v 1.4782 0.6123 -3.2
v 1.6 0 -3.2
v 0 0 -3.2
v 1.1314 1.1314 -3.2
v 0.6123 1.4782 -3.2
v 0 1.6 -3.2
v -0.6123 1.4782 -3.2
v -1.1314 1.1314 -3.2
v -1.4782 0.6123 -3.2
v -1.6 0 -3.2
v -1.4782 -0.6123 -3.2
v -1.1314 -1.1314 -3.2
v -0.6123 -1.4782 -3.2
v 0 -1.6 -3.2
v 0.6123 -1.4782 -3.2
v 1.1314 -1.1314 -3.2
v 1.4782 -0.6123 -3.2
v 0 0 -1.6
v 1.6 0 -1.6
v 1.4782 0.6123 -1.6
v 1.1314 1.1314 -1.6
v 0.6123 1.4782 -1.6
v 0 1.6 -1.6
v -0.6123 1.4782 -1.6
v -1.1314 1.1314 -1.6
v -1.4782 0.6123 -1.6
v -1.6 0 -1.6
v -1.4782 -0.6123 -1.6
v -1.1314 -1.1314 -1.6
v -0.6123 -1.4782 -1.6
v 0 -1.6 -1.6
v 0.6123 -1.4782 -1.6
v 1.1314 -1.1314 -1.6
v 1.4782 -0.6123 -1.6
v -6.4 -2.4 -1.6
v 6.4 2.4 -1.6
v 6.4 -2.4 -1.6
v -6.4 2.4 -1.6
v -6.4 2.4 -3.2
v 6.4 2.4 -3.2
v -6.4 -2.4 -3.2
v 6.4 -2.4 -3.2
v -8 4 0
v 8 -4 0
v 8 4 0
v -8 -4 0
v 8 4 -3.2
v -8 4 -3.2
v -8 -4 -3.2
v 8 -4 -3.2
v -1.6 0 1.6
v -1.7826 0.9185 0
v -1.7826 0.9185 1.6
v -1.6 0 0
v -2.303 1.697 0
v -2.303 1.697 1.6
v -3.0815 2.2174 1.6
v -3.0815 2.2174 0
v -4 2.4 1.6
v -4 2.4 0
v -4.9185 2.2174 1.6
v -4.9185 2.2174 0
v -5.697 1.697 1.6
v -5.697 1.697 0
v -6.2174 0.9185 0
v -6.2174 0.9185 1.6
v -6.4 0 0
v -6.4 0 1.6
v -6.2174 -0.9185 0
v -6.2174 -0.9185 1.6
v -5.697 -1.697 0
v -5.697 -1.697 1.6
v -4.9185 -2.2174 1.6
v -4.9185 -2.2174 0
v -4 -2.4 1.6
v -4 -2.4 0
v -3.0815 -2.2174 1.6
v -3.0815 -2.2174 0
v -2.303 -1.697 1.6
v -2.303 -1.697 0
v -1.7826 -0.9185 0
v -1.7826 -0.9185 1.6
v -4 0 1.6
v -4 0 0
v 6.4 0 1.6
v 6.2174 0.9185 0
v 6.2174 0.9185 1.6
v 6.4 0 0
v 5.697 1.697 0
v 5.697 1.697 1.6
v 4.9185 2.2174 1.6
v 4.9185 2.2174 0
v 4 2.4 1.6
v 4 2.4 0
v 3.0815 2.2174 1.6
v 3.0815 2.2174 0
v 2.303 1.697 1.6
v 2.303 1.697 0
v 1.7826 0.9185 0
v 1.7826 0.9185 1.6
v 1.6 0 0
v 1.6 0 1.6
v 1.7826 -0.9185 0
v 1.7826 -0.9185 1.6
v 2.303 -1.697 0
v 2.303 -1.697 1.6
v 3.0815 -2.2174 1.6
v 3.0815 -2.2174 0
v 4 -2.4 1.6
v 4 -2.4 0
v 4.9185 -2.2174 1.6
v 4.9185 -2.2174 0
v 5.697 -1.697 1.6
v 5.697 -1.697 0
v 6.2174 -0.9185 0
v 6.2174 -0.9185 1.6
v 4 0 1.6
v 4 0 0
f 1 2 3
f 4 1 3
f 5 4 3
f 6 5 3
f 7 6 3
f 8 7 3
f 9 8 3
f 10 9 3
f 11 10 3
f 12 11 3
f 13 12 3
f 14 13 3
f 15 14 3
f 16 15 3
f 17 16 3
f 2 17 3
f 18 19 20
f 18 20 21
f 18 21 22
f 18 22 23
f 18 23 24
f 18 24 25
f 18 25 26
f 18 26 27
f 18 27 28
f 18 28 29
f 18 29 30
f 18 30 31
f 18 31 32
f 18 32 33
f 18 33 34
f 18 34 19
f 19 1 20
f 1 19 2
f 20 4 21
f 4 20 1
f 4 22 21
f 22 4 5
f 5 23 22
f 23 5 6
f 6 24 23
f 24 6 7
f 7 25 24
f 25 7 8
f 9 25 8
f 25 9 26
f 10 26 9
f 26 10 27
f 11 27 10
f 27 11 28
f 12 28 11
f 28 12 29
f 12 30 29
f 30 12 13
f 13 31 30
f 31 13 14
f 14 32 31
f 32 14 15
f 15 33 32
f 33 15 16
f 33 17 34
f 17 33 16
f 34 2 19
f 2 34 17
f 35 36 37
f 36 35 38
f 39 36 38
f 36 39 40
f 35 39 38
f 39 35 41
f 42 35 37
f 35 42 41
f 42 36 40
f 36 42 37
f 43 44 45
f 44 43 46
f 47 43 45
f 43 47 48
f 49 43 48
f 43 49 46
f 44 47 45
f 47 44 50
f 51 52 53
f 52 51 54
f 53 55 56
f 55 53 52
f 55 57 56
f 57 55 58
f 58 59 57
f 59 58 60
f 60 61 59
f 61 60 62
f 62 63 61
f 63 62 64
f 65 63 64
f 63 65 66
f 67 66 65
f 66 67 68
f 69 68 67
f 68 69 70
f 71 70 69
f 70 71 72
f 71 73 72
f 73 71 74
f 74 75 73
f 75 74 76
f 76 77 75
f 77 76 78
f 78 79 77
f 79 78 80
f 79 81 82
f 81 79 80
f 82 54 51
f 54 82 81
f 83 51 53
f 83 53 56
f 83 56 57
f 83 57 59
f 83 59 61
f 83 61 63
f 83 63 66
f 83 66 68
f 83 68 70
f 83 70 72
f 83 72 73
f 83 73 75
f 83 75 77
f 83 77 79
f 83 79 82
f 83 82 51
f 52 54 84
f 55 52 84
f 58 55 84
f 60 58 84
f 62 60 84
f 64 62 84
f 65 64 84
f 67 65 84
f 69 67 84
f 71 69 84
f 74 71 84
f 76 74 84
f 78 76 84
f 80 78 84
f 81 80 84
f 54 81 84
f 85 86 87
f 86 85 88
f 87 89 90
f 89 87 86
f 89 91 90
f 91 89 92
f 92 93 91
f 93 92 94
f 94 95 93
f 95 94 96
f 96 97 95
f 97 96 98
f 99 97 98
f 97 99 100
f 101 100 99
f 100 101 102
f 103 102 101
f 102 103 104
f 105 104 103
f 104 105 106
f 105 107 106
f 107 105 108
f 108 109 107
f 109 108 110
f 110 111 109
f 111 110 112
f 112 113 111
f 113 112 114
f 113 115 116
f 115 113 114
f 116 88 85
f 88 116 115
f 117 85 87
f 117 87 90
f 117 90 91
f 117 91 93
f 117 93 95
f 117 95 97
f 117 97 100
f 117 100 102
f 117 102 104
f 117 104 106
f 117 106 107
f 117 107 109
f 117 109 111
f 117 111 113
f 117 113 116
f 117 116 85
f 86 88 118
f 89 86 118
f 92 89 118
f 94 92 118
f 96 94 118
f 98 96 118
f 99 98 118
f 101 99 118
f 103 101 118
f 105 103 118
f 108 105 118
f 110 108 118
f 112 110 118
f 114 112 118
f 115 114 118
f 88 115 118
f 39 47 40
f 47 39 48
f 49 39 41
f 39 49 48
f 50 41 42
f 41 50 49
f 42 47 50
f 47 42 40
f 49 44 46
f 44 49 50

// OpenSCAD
// file: ../p/stud.scad
use <../lib.scad>
use <4-4cyli.scad>
use <4-4disc.scad>
use <4-4edge.scad>
function ldraw_lib__stud() = [
// 0 Stud
// 0 Name: stud.dat
// 0 Author: James Jessiman
// 0 !LDRAW_ORG Primitive UPDATE 2012-01
// 0 !LICENSE Licensed under CC BY 4.0 : see CAreadme.txt
// 
// 0 BFC CERTIFY CCW
  [0,"BFC","CERTIFY"],
  [0,"BFC","CCW"],
// 
// 0 !HISTORY 2002-04-04 [sbliss] Modified for BFC compliance
// 0 !HISTORY 2002-04-25 [PTadmin] Official Update 2002-02
// 0 !HISTORY 2007-06-24 [PTadmin] Header formatted for Contributor Agreement
// 0 !HISTORY 2008-07-01 [PTadmin] Official Update 2008-01
// 0 !HISTORY 2012-02-16 [Philo] Changed to CCW
// 0 !HISTORY 2012-03-30 [PTadmin] Official Update 2012-01
// 
// 
// 1 16 0 0 0 6 0 0 0 1 0 0 0 6 4-4edge.dat
  [1,16,0,0,0,6,0,0,0,1,0,0,0,6, ldraw_lib__4_4edge()],
// 1 16 0 -4 0 6 0 0 0 1 0 0 0 6 4-4edge.dat
  [1,16,0,-4,0,6,0,0,0,1,0,0,0,6, ldraw_lib__4_4edge()],
// 1 16 0 0 0 6 0 0 0 -4 0 0 0 6 4-4cyli.dat
  [1,16,0,0,0,6,0,0,0,-4,0,0,0,6, ldraw_lib__4_4cyli()],
// 1 16 0 -4 0 6 0 0 0 1 0 0 0 6 4-4disc.dat
  [1,16,0,-4,0,6,0,0,0,1,0,0,0,6, ldraw_lib__4_4disc()],
  [-1,16,0,0,0,6,0,0,0,-1,0,0,0,6, ldraw_lib__4_4disc()],
];
module ldraw_lib__stud(step=0, col=false, unit=2/5, alt=false, line=0.2, solid=!$preview)
    makepoly(ldraw_lib__stud(), step=step, col=col, unit=unit, alt=alt, line=line, solid=solid);
ldraw_lib__stud(line=0.2);
// file: ../p/4-4edge.scad
use <../lib.scad>
function ldraw_lib__4_4edge() = [
// 0 Circle 1.0
// 0 Name: 4-4edge.dat
// 0 Author: James Jessiman
// 0 !LDRAW_ORG Primitive UPDATE 2017-01
// 0 !LICENSE Licensed under CC BY 2.0 and CC BY 4.0 : see CAreadme.txt
// 
// 0 BFC CERTIFY CCW
  [0,"BFC","CERTIFY"],
  [0,"BFC","CCW"],
// 
// 0 !HISTORY 1998-12-15 [PTadmin] Official Update 1998-10
// 0 !HISTORY 2005-12-28 [PTadmin] Official Update 2005-01
// 0 !HISTORY 2007-06-24 [PTadmin] Header formatted for Contributor Agreement
// 0 !HISTORY 2008-07-01 [PTadmin] Official Update 2008-01
// 0 !HISTORY 2017-01-15 [Steffen] BFCed
// 0 !HISTORY 2017-12-30 [PTadmin] Official Update 2017-01
// 
// 
// 2 24 1 0 0 0.9239 0 0.3827
  [2,24,1,0,0,0.9239,0,0.3827],
// 2 24 0.9239 0 0.3827 0.7071 0 0.7071
  [2,24,0.9239,0,0.3827,0.7071,0,0.7071],
// 2 24 0.7071 0 0.7071 0.3827 0 0.9239
  [2,24,0.7071,0,0.7071,0.3827,0,0.9239],
// 2 24 0.3827 0 0.9239 0 0 1
  [2,24,0.3827,0,0.9239,0,0,1],
// 2 24 0 0 1 -0.3827 0 0.9239
  [2,24,0,0,1,-0.3827,0,0.9239],
// 2 24 -0.3827 0 0.9239 -0.7071 0 0.7071
  [2,24,-0.3827,0,0.9239,-0.7071,0,0.7071],
// 2 24 -0.7071 0 0.7071 -0.9239 0 0.3827
  [2,24,-0.7071,0,0.7071,-0.9239,0,0.3827],
// 2 24 -0.9239 0 0.3827 -1 0 -0
  [2,24,-0.9239,0,0.3827,-1,0,-0],
// 2 24 -1 0 -0 -0.9239 0 -0.3827
  [2,24,-1,0,-0,-0.9239,0,-0.3827],
// 2 24 -0.9239 0 -0.3827 -0.7071 0 -0.7071
  [2,24,-0.9239,0,-0.3827,-0.7071,0,-0.7071],
// 2 24 -0.7071 0 -0.7071 -0.3827 0 -0.9239
  [2,24,-0.7071,0,-0.7071,-0.3827,0,-0.9239],
// 2 24 -0.3827 0 -0.9239 0 0 -1
  [2,24,-0.3827,0,-0.9239,0,0,-1],
// 2 24 0 0 -1 0.3827 0 -0.9239
  [2,24,0,0,-1,0.3827,0,-0.9239],
// 2 24 0.3827 0 -0.9239 0.7071 0 -0.7071
  [2,24,0.3827,0,-0.9239,0.7071,0,-0.7071],
// 2 24 0.7071 0 -0.7071 0.9239 0 -0.3827
  [2,24,0.7071,0,-0.7071,0.9239,0,-0.3827],
// 2 24 0.9239 0 -0.3827 1 0 0
  [2,24,0.9239,0,-0.3827,1,0,0],
];
module ldraw_lib__4_4edge(step=0, col=false, unit=2/5, alt=false, line=0.2, solid=!$preview)
    makepoly(ldraw_lib__4_4edge(), step=step, col=col, unit=unit, alt=alt, line=line, solid=solid);
ldraw_lib__4_4edge(line=0.2);
// file: ../p/4-4disc.scad
use <../lib.scad>
function ldraw_lib__4_4disc() = [
// 0 Disc 1.0
// 0 Name: 4-4disc.dat
// 0 Author: James Jessiman
// 0 !LDRAW_ORG Primitive UPDATE 2002-02
// 0 !LICENSE Licensed under CC BY 2.0 and CC BY 4.0 : see CAreadme.txt
// 
// 0 BFC CERTIFY CCW
  [0,"BFC","CERTIFY"],
  [0,"BFC","CCW"],
// 
// 0 !HISTORY 1998-12-15 [PTadmin] Official Update 1998-10
// 0 !HISTORY 2002-03-23 [sbliss] Added BFC statement
// 0 !HISTORY 2002-04-25 [PTadmin] Official Update 2002-02
// 0 !HISTORY 2007-06-24 [PTadmin] Header formatted for Contributor Agreement
// 0 !HISTORY 2008-07-01 [PTadmin] Official Update 2008-01
// 
// 
// 3 16 0 0 0 1 0 0 0.9239 0 0.3827
  [3,16,0,0,0,1,0,0,0.9239,0,0.3827],
// 3 16 0 0 0 0.9239 0 0.3827 0.7071 0 0.7071
  [3,16,0,0,0,0.9239,0,0.3827,0.7071,0,0.7071],
// 3 16 0 0 0 0.7071 0 0.7071 0.3827 0 0.9239
  [3,16,0,0,0,0.7071,0,0.7071,0.3827,0,0.9239],
// 3 16 0 0 0 0.3827 0 0.9239 0 0 1
  [3,16,0,0,0,0.3827,0,0.9239,0,0,1],
// 3 16 0 0 0 0 0 1 -0.3827 0 0.9239
  [3,16,0,0,0,0,0,1,-0.3827,0,0.9239],
// 3 16 0 0 0 -0.3827 0 0.9239 -0.7071 0 0.7071
  [3,16,0,0,0,-0.3827,0,0.9239,-0.7071,0,0.7071],
// 3 16 0 0 0 -0.7071 0 0.7071 -0.9239 0 0.3827
  [3,16,0,0,0,-0.7071,0,0.7071,-0.9239,0,0.3827],
// 3 16 0 0 0 -0.9239 0 0.3827 -1 0 -0
  [3,16,0,0,0,-0.9239,0,0.3827,-1,0,-0],
// 3 16 0 0 0 -1 0 -0 -0.9239 0 -0.3827
  [3,16,0,0,0,-1,0,-0,-0.9239,0,-0.3827],
// 3 16 0 0 0 -0.9239 0 -0.3827 -0.7071 0 -0.7071
  [3,16,0,0,0,-0.9239,0,-0.3827,-0.7071,0,-0.7071],
// 3 16 0 0 0 -0.7071 0 -0.7071 -0.3827 0 -0.9239
  [3,16,0,0,0,-0.7071,0,-0.7071,-0.3827,0,-0.9239],
// 3 16 0 0 0 -0.3827 0 -0.9239 0 0 -1
  [3,16,0,0,0,-0.3827,0,-0.9239,0,0,-1],
// 3 16 0 0 0 0 0 -1 0.3827 0 -0.9239
  [3,16,0,0,0,0,0,-1,0.3827,0,-0.9239],
// 3 16 0 0 0 0.3827 0 -0.9239 0.7071 0 -0.7071
  [3,16,0,0,0,0.3827,0,-0.9239,0.7071,0,-0.7071],
// 3 16 0 0 0 0.7071 0 -0.7071 0.9239 0 -0.3827
  [3,16,0,0,0,0.7071,0,-0.7071,0.9239,0,-0.3827],
// 3 16 0 0 0 0.9239 0 -0.3827 1 0 0
  [3,16,0,0,0,0.9239,0,-0.3827,1,0,0],
// 0
];
module ldraw_lib__4_4disc(step=0, col=false, unit=2/5, alt=false, line=0.2, solid=!$preview)
    makepoly(ldraw_lib__4_4disc(), step=step, col=col, unit=unit, alt=alt, line=line, solid=solid);
ldraw_lib__4_4disc(line=0.2);
// file: ../p/4-4cyli.scad
use <../lib.scad>
$fa=1; $fs=0.2;
function ldraw_lib__4_4cyli(realsolid=false) = [
// 0 Cylinder 1.0
// 0 Name: 4-4cyli.dat
// 0 Author: James Jessiman
// 0 !LDRAW_ORG Primitive UPDATE 2005-01
// 0 !LICENSE Licensed under CC BY 2.0 and CC BY 4.0 : see CAreadme.txt
// 
// 0 BFC CERTIFY CCW
  [0,"BFC","CERTIFY"],
  [0,"BFC","CCW"],
// 
// 0 !HISTORY 1998-12-15 [PTadmin] Official Update 1998-10
// 0 !HISTORY 2002-03-23 [sbliss] Added BFC statement; merged headers from files in distributions LDraw 0.27 and Complete.
// 0 !HISTORY 2002-04-25 [PTadmin] Official Update 2002-02
// 0 !HISTORY 2004-12-14 [guyvivan] BFC CCW
// 0 !HISTORY 2005-12-28 [PTadmin] Official Update 2005-01
// 0 !HISTORY 2007-06-24 [PTadmin] Header formatted for Contributor Agreement
// 0 !HISTORY 2008-07-01 [PTadmin] Official Update 2008-01
// 
// 
// 4 16 1 1 0 0.9239 1 0.3827 0.9239 0 0.3827 1 0 0
  [4,16,1,1,0,0.9239,1,0.3827,0.9239,0,0.3827,1,0,0],
// 5 24 1 0 0 1 1 0 0.9239 0 0.3827 0.9239 0 -0.3827
  [5,24,1,0,0,1,1,0,0.9239,0,0.3827,0.9239,0,-0.3827],
// 4 16 0.9239 1 0.3827 0.7071 1 0.7071 0.7071 0 0.7071 0.9239 0 0.3827
  [4,16,0.9239,1,0.3827,0.7071,1,0.7071,0.7071,0,0.7071,0.9239,0,0.3827],
// 5 24 0.9239 0 0.3827 0.9239 1 0.3827 0.7071 0 0.7071 1 0 0
  [5,24,0.9239,0,0.3827,0.9239,1,0.3827,0.7071,0,0.7071,1,0,0],
// 4 16 0.7071 1 0.7071 0.3827 1 0.9239 0.3827 0 0.9239 0.7071 0 0.7071
  [4,16,0.7071,1,0.7071,0.3827,1,0.9239,0.3827,0,0.9239,0.7071,0,0.7071],
// 5 24 0.7071 0 0.7071 0.7071 1 0.7071 0.3827 0 0.9239 0.9239 0 0.3827
  [5,24,0.7071,0,0.7071,0.7071,1,0.7071,0.3827,0,0.9239,0.9239,0,0.3827],
// 4 16 0.3827 1 0.9239 0 1 1 0 0 1 0.3827 0 0.9239
  [4,16,0.3827,1,0.9239,0,1,1,0,0,1,0.3827,0,0.9239],
// 5 24 0.3827 0 0.9239 0.3827 1 0.9239 0 0 1 0.7071 0 0.7071
  [5,24,0.3827,0,0.9239,0.3827,1,0.9239,0,0,1,0.7071,0,0.7071],
// 4 16 0 1 1 -0.3827 1 0.9239 -0.3827 0 0.9239 0 0 1
  [4,16,0,1,1,-0.3827,1,0.9239,-0.3827,0,0.9239,0,0,1],
// 5 24 0 0 1 0 1 1 -0.3827 0 0.9239 0.3827 0 0.9239
  [5,24,0,0,1,0,1,1,-0.3827,0,0.9239,0.3827,0,0.9239],
// 4 16 -0.3827 1 0.9239 -0.7071 1 0.7071 -0.7071 0 0.7071 -0.3827 0 0.9239
  [4,16,-0.3827,1,0.9239,-0.7071,1,0.7071,-0.7071,0,0.7071,-0.3827,0,0.9239],
// 5 24 -0.3827 0 0.9239 -0.3827 1 0.9239 -0.7071 0 0.7071 0 0 1
  [5,24,-0.3827,0,0.9239,-0.3827,1,0.9239,-0.7071,0,0.7071,0,0,1],
// 4 16 -0.7071 1 0.7071 -0.9239 1 0.3827 -0.9239 0 0.3827 -0.7071 0 0.7071
  [4,16,-0.7071,1,0.7071,-0.9239,1,0.3827,-0.9239,0,0.3827,-0.7071,0,0.7071],
// 5 24 -0.7071 0 0.7071 -0.7071 1 0.7071 -0.9239 0 0.3827 -0.3827 0 0.9239
  [5,24,-0.7071,0,0.7071,-0.7071,1,0.7071,-0.9239,0,0.3827,-0.3827,0,0.9239],
// 4 16 -0.9239 1 0.3827 -1 1 0 -1 0 0 -0.9239 0 0.3827
  [4,16,-0.9239,1,0.3827,-1,1,0,-1,0,0,-0.9239,0,0.3827],
// 5 24 -0.9239 0 0.3827 -0.9239 1 0.3827 -1 0 0 -0.7071 0 0.7071
  [5,24,-0.9239,0,0.3827,-0.9239,1,0.3827,-1,0,0,-0.7071,0,0.7071],
// 4 16 -1 1 0 -0.9239 1 -0.3827 -0.9239 0 -0.3827 -1 0 0
  [4,16,-1,1,0,-0.9239,1,-0.3827,-0.9239,0,-0.3827,-1,0,0],
// 5 24 -1 0 0 -1 1 0 -0.9239 0 -0.3827 -0.9239 0 0.3827
  [5,24,-1,0,0,-1,1,0,-0.9239,0,-0.3827,-0.9239,0,0.3827],
// 4 16 -0.9239 1 -0.3827 -0.7071 1 -0.7071 -0.7071 0 -0.7071 -0.9239 0 -0.3827
  [4,16,-0.9239,1,-0.3827,-0.7071,1,-0.7071,-0.7071,0,-0.7071,-0.9239,0,-0.3827],
// 5 24 -0.9239 0 -0.3827 -0.9239 1 -0.3827 -0.7071 0 -0.7071 -1 0 0
  [5,24,-0.9239,0,-0.3827,-0.9239,1,-0.3827,-0.7071,0,-0.7071,-1,0,0],
// 4 16 -0.7071 1 -0.7071 -0.3827 1 -0.9239 -0.3827 0 -0.9239 -0.7071 0 -0.7071
  [4,16,-0.7071,1,-0.7071,-0.3827,1,-0.9239,-0.3827,0,-0.9239,-0.7071,0,-0.7071],
// 5 24 -0.7071 0 -0.7071 -0.7071 1 -0.7071 -0.3827 0 -0.9239 -0.9239 0 -0.3827
  [5,24,-0.7071,0,-0.7071,-0.7071,1,-0.7071,-0.3827,0,-0.9239,-0.9239,0,-0.3827],
// 4 16 -0.3827 1 -0.9239 0 1 -1 0 0 -1 -0.3827 0 -0.9239
  [4,16,-0.3827,1,-0.9239,0,1,-1,0,0,-1,-0.3827,0,-0.9239],
// 5 24 -0.3827 0 -0.9239 -0.3827 1 -0.9239 0 0 -1 -0.7071 0 -0.7071
  [5,24,-0.3827,0,-0.9239,-0.3827,1,-0.9239,0,0,-1,-0.7071,0,-0.7071],
// 4 16 0 1 -1 0.3827 1 -0.9239 0.3827 0 -0.9239 0 0 -1
  [4,16,0,1,-1,0.3827,1,-0.9239,0.3827,0,-0.9239,0,0,-1],
// 5 24 0 0 -1 0 1 -1 0.3827 0 -0.9239 -0.3827 0 -0.9239
  [5,24,0,0,-1,0,1,-1,0.3827,0,-0.9239,-0.3827,0,-0.9239],
// 4 16 0.3827 1 -0.9239 0.7071 1 -0.7071 0.7071 0 -0.7071 0.3827 0 -0.9239
  [4,16,0.3827,1,-0.9239,0.7071,1,-0.7071,0.7071,0,-0.7071,0.3827,0,-0.9239],
// 5 24 0.3827 0 -0.9239 0.3827 1 -0.9239 0.7071 0 -0.7071 0 0 -1
  [5,24,0.3827,0,-0.9239,0.3827,1,-0.9239,0.7071,0,-0.7071,0,0,-1],
// 4 16 0.7071 1 -0.7071 0.9239 1 -0.3827 0.9239 0 -0.3827 0.7071 0 -0.7071
  [4,16,0.7071,1,-0.7071,0.9239,1,-0.3827,0.9239,0,-0.3827,0.7071,0,-0.7071],
// 5 24 0.7071 0 -0.7071 0.7071 1 -0.7071 0.9239 0 -0.3827 0.3827 0 -0.9239
  [5,24,0.7071,0,-0.7071,0.7071,1,-0.7071,0.9239,0,-0.3827,0.3827,0,-0.9239],
// 4 16 0.9239 1 -0.3827 1 1 0 1 0 0 0.9239 0 -0.3827
  [4,16,0.9239,1,-0.3827,1,1,0,1,0,0,0.9239,0,-0.3827],
// 5 24 0.9239 0 -0.3827 0.9239 1 -0.3827 1 0 0 0.7071 0 -0.7071
  [5,24,0.9239,0,-0.3827,0.9239,1,-0.3827,1,0,0,0.7071,0,-0.7071],
// 0
];
module ldraw_lib__4_4cyli(step=0, col=false, unit=2/5, alt=false, line=0.2, solid=!$preview)
    makepoly(ldraw_lib__4_4cyli(solid), step=step, col=col, unit=unit, alt=alt, line=line, solid=solid);
ldraw_lib__4_4cyli(line=0.2);
// file: ../p/stug-1x2.scad
use <../lib.scad>
use <stud.scad>
$fa=1; $fs=0.2;
function ldraw_lib__stug_1x2(realsolid=false) = [
// 0 Stud Group  1 x  2
// 0 Name: stug-1x2.dat
// 0 Author: Steffen [Steffen]
// 0 !LDRAW_ORG Primitive UPDATE 2011-01
// 0 !LICENSE Licensed under CC BY 2.0 and CC BY 4.0 : see CAreadme.txt
// 
// 0 BFC CERTIFY CCW
  [0,"BFC","CERTIFY"],
  [0,"BFC","CCW"],
// 
// 0 !HISTORY 2011-07-25 [PTadmin] Official Update 2011-01
// 
// 
// 1 16 -10 0 0 1 0 0 0 1 0 0 0 1 stud.dat
  [1,16,-10,0,0,1,0,0,0,1,0,0,0,1, ldraw_lib__stud(realsolid)],
// 1 16 10 0 0 1 0 0 0 1 0 0 0 1 stud.dat
  [1,16,10,0,0,1,0,0,0,1,0,0,0,1, ldraw_lib__stud(realsolid)],
];
module ldraw_lib__stug_1x2(step=0, col=false, unit=2/5, alt=false, line=0.2, solid=!$preview)
    makepoly(ldraw_lib__stug_1x2(solid), step=step, col=col, unit=unit, alt=alt, line=line, solid=solid);
ldraw_lib__stug_1x2(line=0.2);
// file: ../p/stud3.scad
use <../lib.scad>
use <4-4cyli.scad>
use <4-4disc.scad>
use <4-4edge.scad>
function ldraw_lib__stud3() = [
// 0 Stud Tube Solid
// 0 Name: stud3.dat
// 0 Author: James Jessiman
// 0 !LDRAW_ORG Primitive UPDATE 2012-01
// 0 !LICENSE Licensed under CC BY 4.0 : see CAreadme.txt
// 
// 0 BFC CERTIFY CCW
  [0,"BFC","CERTIFY"],
  [0,"BFC","CCW"],
// 
// 0 !HISTORY 2002-04-04 [sbliss] Modified for BFC compliance
// 0 !HISTORY 2002-04-25 [PTadmin] Official Update 2002-02
// 0 !HISTORY 2007-06-24 [PTadmin] Header formatted for Contributor Agreement
// 0 !HISTORY 2008-07-01 [PTadmin] Official Update 2008-01
// 0 !HISTORY 2012-02-16 [Philo] Changed to CCW
// 0 !HISTORY 2012-03-30 [PTadmin] Official Update 2012-01
// 
// 
// 1 16 0 -4 0 4 0 0 0 1 0 0 0 4 4-4edge.dat
  [1,16,0,-4,0,4,0,0,0,1,0,0,0,4, ldraw_lib__4_4edge()],
// 1 16 0 0 0 4 0 0 0 1 0 0 0 4 4-4edge.dat
  [1,16,0,0,0,4,0,0,0,1,0,0,0,4, ldraw_lib__4_4edge()],
// 1 16 0 -4 0 4 0 0 0 1 0 0 0 4 4-4disc.dat
  [1,16,0,-4,0,4,0,0,0,1,0,0,0,4, ldraw_lib__4_4disc()],
  [-1,16,0,0,0,4,0,0,0,-1,0,0,0,4, ldraw_lib__4_4disc()],
// 1 16 0 -4 0 4 0 0 0 4 0 0 0 4 4-4cyli.dat
  [1,16,0,-4,0,4,0,0,0,4,0,0,0,4, ldraw_lib__4_4cyli()],
];
module ldraw_lib__stud3(step=0, col=false, unit=2/5, alt=false, line=0.2, solid=!$preview)
    makepoly(ldraw_lib__stud3(), step=step, col=col, unit=unit, alt=alt, line=line, solid=solid);
ldraw_lib__stud3(line=0.2);
// file: ../p/box5.scad
use <../lib.scad>
function ldraw_lib__box5() = [
// 0 Box with 5 Faces and All Edges
// 0 Name: box5.dat
// 0 Author: James Jessiman
// 0 !LDRAW_ORG Primitive UPDATE 2012-01
// 0 !LICENSE Licensed under CC BY 2.0 and CC BY 4.0 : see CAreadme.txt
// 
// 0 BFC CERTIFY CCW
  [0,"BFC","CERTIFY"],
  [0,"BFC","CCW"],
// 
// 0 !HISTORY 2002-04-03 [sbliss] Modified for BFC compliance
// 0 !HISTORY 2002-04-25 [PTadmin] Official Update 2002-02
// 0 !HISTORY 2007-06-24 [PTadmin] Header formatted for Contributor Agreement
// 0 !HISTORY 2008-07-01 [PTadmin] Official Update 2008-01
// 0 !HISTORY 2012-02-16 [Philo] Changed to CCW
// 0 !HISTORY 2012-03-30 [PTadmin] Official Update 2012-01
// 
// 
// 2 24 1 1 1 -1 1 1
  [2,24,1,1,1,-1,1,1],
// 2 24 -1 1 1 -1 1 -1
  [2,24,-1,1,1,-1,1,-1],
// 2 24 -1 1 -1 1 1 -1
  [2,24,-1,1,-1,1,1,-1],
// 2 24 1 1 -1 1 1 1
  [2,24,1,1,-1,1,1,1],
// 2 24 1 0 1 -1 0 1
  [2,24,1,0,1,-1,0,1],
// 2 24 -1 0 1 -1 0 -1
  [2,24,-1,0,1,-1,0,-1],
// 2 24 -1 0 -1 1 0 -1
  [2,24,-1,0,-1,1,0,-1],
// 2 24 1 0 -1 1 0 1
  [2,24,1,0,-1,1,0,1],
// 2 24 1 0 1 1 1 1
  [2,24,1,0,1,1,1,1],
// 2 24 -1 0 1 -1 1 1
  [2,24,-1,0,1,-1,1,1],
// 2 24 1 0 -1 1 1 -1
  [2,24,1,0,-1,1,1,-1],
// 2 24 -1 0 -1 -1 1 -1
  [2,24,-1,0,-1,-1,1,-1],
// 4 16 -1 1 1 1 1 1 1 1 -1 -1 1 -1
  [4,16,-1,1,1,1,1,1,1,1,-1,-1,1,-1],
// 4 16 -1 1 1 -1 0 1 1 0 1 1 1 1
  [4,16,-1,1,1,-1,0,1,1,0,1,1,1,1],
// 4 16 -1 1 -1 -1 0 -1 -1 0 1 -1 1 1
  [4,16,-1,1,-1,-1,0,-1,-1,0,1,-1,1,1],
// 4 16 1 1 -1 1 0 -1 -1 0 -1 -1 1 -1
  [4,16,1,1,-1,1,0,-1,-1,0,-1,-1,1,-1],
// 4 16 1 1 1 1 0 1 1 0 -1 1 1 -1
  [4,16,1,1,1,1,0,1,1,0,-1,1,1,-1],
];
makepoly(ldraw_lib__box5(), line=0.2);
// file: ../p/box4t.scad
use <../lib.scad>
function ldraw_lib__box4t() = [
// 0 Box with 4 Adjacent Faces and All Edges
// 0 Name: box4t.dat
// 0 Author: Tore Eriksson [Tore_Eriksson]
// 0 !LDRAW_ORG Primitive UPDATE 2003-02
// 0 !LICENSE Licensed under CC BY 2.0 and CC BY 4.0 : see CAreadme.txt
// 
// 0 BFC CERTIFY CCW
  [0,"BFC","CERTIFY"],
  [0,"BFC","CCW"],
// 
// 0 !HISTORY 1997-09-29 [PTadmin] Official Update 1997-15
// 0 !HISTORY 2002-08-31 [izanette] Modified with WINDZ for BFC compliance
// 0 !HISTORY 2003-08-01 [PTadmin] Official Update 2003-02
// 0 !HISTORY 2007-06-24 [PTadmin] Header formatted for Contributor Agreement
// 0 !HISTORY 2008-07-01 [PTadmin] Official Update 2008-01
// 
// 
// 2 24 1 1 1 -1 1 1
  [2,24,1,1,1,-1,1,1],
// 2 24 -1 1 1 -1 1 -1
  [2,24,-1,1,1,-1,1,-1],
// 2 24 -1 1 -1 1 1 -1
  [2,24,-1,1,-1,1,1,-1],
// 2 24 1 1 -1 1 1 1
  [2,24,1,1,-1,1,1,1],
// 2 24 1 0 1 -1 0 1
  [2,24,1,0,1,-1,0,1],
// 2 24 -1 0 1 -1 0 -1
  [2,24,-1,0,1,-1,0,-1],
// 2 24 -1 0 -1 1 0 -1
  [2,24,-1,0,-1,1,0,-1],
// 2 24 1 0 -1 1 0 1
  [2,24,1,0,-1,1,0,1],
// 2 24 1 0 1 1 1 1
  [2,24,1,0,1,1,1,1],
// 2 24 -1 0 1 -1 1 1
  [2,24,-1,0,1,-1,1,1],
// 2 24 1 0 -1 1 1 -1
  [2,24,1,0,-1,1,1,-1],
// 2 24 -1 0 -1 -1 1 -1
  [2,24,-1,0,-1,-1,1,-1],
// 4 16 1 1 1 1 1 -1 -1 1 -1 -1 1 1
  [4,16,1,1,1,1,1,-1,-1,1,-1,-1,1,1],
// 4 16 1 1 1 -1 1 1 -1 0 1 1 0 1
  [4,16,1,1,1,-1,1,1,-1,0,1,1,0,1],
// 4 16 -1 1 1 -1 1 -1 -1 0 -1 -1 0 1
  [4,16,-1,1,1,-1,1,-1,-1,0,-1,-1,0,1],
// 0 4 16 -1 1 -1 -1 0 -1 1 0 -1 1 1 -1
// 4 16 1 1 -1 1 1 1 1 0 1 1 0 -1
  [4,16,1,1,-1,1,1,1,1,0,1,1,0,-1],
// 0
];
makepoly(ldraw_lib__box4t(), line=0.2);
// file: s/3023bs01.scad
use <../../lib.scad>
use <../../p/box4t.scad>
use <../../p/box5.scad>
use <../../p/stud3.scad>
use <../../p/stug-1x2.scad>
function ldraw_lib__s__3023bs01() = [
// 0 ~Plate  1 x  2 without Front Face
// 0 Name: s\3023bs01.dat
// 0 Author: Massimo Maso [Sirio]
// 0 !LDRAW_ORG Subpart UPDATE 2023-03
// 0 !LICENSE Licensed under CC BY 4.0 : see CAreadme.txt
// 
// 0 BFC CERTIFY CCW
  [0,"BFC","CERTIFY"],
  [0,"BFC","CCW"],
// 
// 0 !HISTORY 2022-01-14 [PTadmin] Official Update 2022-01
// 0 !HISTORY 2023-05-27 [OrionP] Moved from s\3023s01.dat
// 0 !HISTORY 2023-06-24 [OrionP] Official Update 2023-03
// 
// 
// 0 // Primitves
// 1 16 0 4 0 1 0 0 0 -1 0 0 0 1 stud3.dat
  [1,16,0,4,0,1,0,0,0,-1,0,0,0,1, ldraw_lib__stud3()],
// 0 BFC INVERTNEXT
  [0,"BFC","INVERTNEXT"],
// 1 16 0 8 0 16 0 0 0 -4 0 0 0 6 box5.dat
  [1,16,0,8,0,16,0,0,0,-4,0,0,0,6, ldraw_lib__box5()],
// 1 16 0 8 0 20 0 0 0 -8 0 0 0 10 box4t.dat
  [1,16,0,8,0,20,0,0,0,-8,0,0,0,10, ldraw_lib__box4t()],
// 1 16 0 0 0 1 0 0 0 1 0 0 0 1 stug-1x2.dat
  [1,16,0,0,0,1,0,0,0,1,0,0,0,1, ldraw_lib__stug_1x2()],
// 0 // Faces
// 4 16 20 8 10 16 8 6 -16 8 6 -20 8 10
  [4,16,20,8,10,16,8,6,-16,8,6,-20,8,10],
// 4 16 -20 8 10 -16 8 6 -16 8 -6 -20 8 -10
  [4,16,-20,8,10,-16,8,6,-16,8,-6,-20,8,-10],
// 4 16 -20 8 -10 -16 8 -6 16 8 -6 20 8 -10
  [4,16,-20,8,-10,-16,8,-6,16,8,-6,20,8,-10],
// 4 16 20 8 -10 16 8 -6 16 8 6 20 8 10
  [4,16,20,8,-10,16,8,-6,16,8,6,20,8,10],
];
module ldraw_lib__s__3023bs01(step=0, col=false, unit=2/5, alt=false, line=0.2, solid=!$preview)
    makepoly(ldraw_lib__s__3023bs01(), step=step, col=col, unit=unit, alt=alt, line=line, solid=solid);
ldraw_lib__s__3023bs01(line=0.2);
// file: 3023b.scad
use <../lib.scad>
use <s/3023bs01.scad>
function ldraw_lib__3023b() = [
// 0 Plate  1 x  2
// 0 Name: 3023b.dat
// 0 Author: James Jessiman
// 0 !LDRAW_ORG Part UPDATE 2023-03
// 0 !LICENSE Licensed under CC BY 4.0 : see CAreadme.txt
// 
// 0 BFC CERTIFY CCW
  [0,"BFC","CERTIFY"],
  [0,"BFC","CCW"],
// 
// 0 !KEYWORDS BrickLink 3023, Rebrickable 3023
// 
// 0 !HISTORY 2001-10-26 [PTadmin] Official Update 2001-01
// 0 !HISTORY 2002-05-07 {unknown} BFC Certification
// 0 !HISTORY 2002-06-11 [PTadmin] Official Update 2002-03
// 0 !HISTORY 2007-06-07 [PTadmin] Header formatted for Contributor Agreement
// 0 !HISTORY 2008-07-01 [PTadmin] Official Update 2008-01
// 0 !HISTORY 2020-03-07 [Sirio] Subparted
// 0 !HISTORY 2022-01-14 [PTadmin] Official Update 2022-01
// 0 !HISTORY 2023-05-26 [OrionP] Moved from 3023.dat
// 0 !HISTORY 2023-06-24 [OrionP] Official Update 2023-03
// 
// 
// 1 16 0 0 0 1 0 0 0 1 0 0 0 1 s\3023bs01.dat
  [1,16,0,0,0,1,0,0,0,1,0,0,0,1, ldraw_lib__s__3023bs01()],
// 4 16 -20 0 -10 -20 8 -10 20 8 -10 20 0 -10
  [4,16,-20,0,-10,-20,8,-10,20,8,-10,20,0,-10],
];
module ldraw_lib__3023b(step=0, col=false, unit=2/5, alt=false, line=0.2, solid=!$preview)
    makepoly(ldraw_lib__3023b(), step=step, col=col, unit=unit, alt=alt, line=line, solid=solid);
ldraw_lib__3023b(line=0.2);
// main file
use <../lib.scad>
use <3023b.scad>
function ldraw_lib__3023() = [
// 0 ~Moved to 3023b
// 0 Name: 3023.dat
// 0 Author: Orion Pobursky [OrionP]
// 0 !LDRAW_ORG Part UPDATE 2024-07
// 0 !LICENSE Licensed under CC BY 4.0 : see CAreadme.txt
// 
// 0 BFC CERTIFY CCW
  [0,"BFC","CERTIFY"],
  [0,"BFC","CCW"],
// 
// 0 !HISTORY 2023-06-24 [OrionP] Official Update 2023-03
// 0 !HISTORY 2024-08-10 [MagFors] Update description
// 0 !HISTORY 2024-08-26 [OrionP] Official Update 2024-07
// 
// 1 16 0 0 0 1 0 0 0 1 0 0 0 1 3023b.dat
  [1,16,0,0,0,1,0,0,0,1,0,0,0,1, ldraw_lib__3023b()],
];
module ldraw_lib__3023(step=0, col=false, unit=2/5, alt=false, line=0.2, solid=!$preview)
    makepoly(ldraw_lib__3023(), step=step, col=col, unit=unit, alt=alt, line=line, solid=solid);
ldraw_lib__3023(line=0.2);
